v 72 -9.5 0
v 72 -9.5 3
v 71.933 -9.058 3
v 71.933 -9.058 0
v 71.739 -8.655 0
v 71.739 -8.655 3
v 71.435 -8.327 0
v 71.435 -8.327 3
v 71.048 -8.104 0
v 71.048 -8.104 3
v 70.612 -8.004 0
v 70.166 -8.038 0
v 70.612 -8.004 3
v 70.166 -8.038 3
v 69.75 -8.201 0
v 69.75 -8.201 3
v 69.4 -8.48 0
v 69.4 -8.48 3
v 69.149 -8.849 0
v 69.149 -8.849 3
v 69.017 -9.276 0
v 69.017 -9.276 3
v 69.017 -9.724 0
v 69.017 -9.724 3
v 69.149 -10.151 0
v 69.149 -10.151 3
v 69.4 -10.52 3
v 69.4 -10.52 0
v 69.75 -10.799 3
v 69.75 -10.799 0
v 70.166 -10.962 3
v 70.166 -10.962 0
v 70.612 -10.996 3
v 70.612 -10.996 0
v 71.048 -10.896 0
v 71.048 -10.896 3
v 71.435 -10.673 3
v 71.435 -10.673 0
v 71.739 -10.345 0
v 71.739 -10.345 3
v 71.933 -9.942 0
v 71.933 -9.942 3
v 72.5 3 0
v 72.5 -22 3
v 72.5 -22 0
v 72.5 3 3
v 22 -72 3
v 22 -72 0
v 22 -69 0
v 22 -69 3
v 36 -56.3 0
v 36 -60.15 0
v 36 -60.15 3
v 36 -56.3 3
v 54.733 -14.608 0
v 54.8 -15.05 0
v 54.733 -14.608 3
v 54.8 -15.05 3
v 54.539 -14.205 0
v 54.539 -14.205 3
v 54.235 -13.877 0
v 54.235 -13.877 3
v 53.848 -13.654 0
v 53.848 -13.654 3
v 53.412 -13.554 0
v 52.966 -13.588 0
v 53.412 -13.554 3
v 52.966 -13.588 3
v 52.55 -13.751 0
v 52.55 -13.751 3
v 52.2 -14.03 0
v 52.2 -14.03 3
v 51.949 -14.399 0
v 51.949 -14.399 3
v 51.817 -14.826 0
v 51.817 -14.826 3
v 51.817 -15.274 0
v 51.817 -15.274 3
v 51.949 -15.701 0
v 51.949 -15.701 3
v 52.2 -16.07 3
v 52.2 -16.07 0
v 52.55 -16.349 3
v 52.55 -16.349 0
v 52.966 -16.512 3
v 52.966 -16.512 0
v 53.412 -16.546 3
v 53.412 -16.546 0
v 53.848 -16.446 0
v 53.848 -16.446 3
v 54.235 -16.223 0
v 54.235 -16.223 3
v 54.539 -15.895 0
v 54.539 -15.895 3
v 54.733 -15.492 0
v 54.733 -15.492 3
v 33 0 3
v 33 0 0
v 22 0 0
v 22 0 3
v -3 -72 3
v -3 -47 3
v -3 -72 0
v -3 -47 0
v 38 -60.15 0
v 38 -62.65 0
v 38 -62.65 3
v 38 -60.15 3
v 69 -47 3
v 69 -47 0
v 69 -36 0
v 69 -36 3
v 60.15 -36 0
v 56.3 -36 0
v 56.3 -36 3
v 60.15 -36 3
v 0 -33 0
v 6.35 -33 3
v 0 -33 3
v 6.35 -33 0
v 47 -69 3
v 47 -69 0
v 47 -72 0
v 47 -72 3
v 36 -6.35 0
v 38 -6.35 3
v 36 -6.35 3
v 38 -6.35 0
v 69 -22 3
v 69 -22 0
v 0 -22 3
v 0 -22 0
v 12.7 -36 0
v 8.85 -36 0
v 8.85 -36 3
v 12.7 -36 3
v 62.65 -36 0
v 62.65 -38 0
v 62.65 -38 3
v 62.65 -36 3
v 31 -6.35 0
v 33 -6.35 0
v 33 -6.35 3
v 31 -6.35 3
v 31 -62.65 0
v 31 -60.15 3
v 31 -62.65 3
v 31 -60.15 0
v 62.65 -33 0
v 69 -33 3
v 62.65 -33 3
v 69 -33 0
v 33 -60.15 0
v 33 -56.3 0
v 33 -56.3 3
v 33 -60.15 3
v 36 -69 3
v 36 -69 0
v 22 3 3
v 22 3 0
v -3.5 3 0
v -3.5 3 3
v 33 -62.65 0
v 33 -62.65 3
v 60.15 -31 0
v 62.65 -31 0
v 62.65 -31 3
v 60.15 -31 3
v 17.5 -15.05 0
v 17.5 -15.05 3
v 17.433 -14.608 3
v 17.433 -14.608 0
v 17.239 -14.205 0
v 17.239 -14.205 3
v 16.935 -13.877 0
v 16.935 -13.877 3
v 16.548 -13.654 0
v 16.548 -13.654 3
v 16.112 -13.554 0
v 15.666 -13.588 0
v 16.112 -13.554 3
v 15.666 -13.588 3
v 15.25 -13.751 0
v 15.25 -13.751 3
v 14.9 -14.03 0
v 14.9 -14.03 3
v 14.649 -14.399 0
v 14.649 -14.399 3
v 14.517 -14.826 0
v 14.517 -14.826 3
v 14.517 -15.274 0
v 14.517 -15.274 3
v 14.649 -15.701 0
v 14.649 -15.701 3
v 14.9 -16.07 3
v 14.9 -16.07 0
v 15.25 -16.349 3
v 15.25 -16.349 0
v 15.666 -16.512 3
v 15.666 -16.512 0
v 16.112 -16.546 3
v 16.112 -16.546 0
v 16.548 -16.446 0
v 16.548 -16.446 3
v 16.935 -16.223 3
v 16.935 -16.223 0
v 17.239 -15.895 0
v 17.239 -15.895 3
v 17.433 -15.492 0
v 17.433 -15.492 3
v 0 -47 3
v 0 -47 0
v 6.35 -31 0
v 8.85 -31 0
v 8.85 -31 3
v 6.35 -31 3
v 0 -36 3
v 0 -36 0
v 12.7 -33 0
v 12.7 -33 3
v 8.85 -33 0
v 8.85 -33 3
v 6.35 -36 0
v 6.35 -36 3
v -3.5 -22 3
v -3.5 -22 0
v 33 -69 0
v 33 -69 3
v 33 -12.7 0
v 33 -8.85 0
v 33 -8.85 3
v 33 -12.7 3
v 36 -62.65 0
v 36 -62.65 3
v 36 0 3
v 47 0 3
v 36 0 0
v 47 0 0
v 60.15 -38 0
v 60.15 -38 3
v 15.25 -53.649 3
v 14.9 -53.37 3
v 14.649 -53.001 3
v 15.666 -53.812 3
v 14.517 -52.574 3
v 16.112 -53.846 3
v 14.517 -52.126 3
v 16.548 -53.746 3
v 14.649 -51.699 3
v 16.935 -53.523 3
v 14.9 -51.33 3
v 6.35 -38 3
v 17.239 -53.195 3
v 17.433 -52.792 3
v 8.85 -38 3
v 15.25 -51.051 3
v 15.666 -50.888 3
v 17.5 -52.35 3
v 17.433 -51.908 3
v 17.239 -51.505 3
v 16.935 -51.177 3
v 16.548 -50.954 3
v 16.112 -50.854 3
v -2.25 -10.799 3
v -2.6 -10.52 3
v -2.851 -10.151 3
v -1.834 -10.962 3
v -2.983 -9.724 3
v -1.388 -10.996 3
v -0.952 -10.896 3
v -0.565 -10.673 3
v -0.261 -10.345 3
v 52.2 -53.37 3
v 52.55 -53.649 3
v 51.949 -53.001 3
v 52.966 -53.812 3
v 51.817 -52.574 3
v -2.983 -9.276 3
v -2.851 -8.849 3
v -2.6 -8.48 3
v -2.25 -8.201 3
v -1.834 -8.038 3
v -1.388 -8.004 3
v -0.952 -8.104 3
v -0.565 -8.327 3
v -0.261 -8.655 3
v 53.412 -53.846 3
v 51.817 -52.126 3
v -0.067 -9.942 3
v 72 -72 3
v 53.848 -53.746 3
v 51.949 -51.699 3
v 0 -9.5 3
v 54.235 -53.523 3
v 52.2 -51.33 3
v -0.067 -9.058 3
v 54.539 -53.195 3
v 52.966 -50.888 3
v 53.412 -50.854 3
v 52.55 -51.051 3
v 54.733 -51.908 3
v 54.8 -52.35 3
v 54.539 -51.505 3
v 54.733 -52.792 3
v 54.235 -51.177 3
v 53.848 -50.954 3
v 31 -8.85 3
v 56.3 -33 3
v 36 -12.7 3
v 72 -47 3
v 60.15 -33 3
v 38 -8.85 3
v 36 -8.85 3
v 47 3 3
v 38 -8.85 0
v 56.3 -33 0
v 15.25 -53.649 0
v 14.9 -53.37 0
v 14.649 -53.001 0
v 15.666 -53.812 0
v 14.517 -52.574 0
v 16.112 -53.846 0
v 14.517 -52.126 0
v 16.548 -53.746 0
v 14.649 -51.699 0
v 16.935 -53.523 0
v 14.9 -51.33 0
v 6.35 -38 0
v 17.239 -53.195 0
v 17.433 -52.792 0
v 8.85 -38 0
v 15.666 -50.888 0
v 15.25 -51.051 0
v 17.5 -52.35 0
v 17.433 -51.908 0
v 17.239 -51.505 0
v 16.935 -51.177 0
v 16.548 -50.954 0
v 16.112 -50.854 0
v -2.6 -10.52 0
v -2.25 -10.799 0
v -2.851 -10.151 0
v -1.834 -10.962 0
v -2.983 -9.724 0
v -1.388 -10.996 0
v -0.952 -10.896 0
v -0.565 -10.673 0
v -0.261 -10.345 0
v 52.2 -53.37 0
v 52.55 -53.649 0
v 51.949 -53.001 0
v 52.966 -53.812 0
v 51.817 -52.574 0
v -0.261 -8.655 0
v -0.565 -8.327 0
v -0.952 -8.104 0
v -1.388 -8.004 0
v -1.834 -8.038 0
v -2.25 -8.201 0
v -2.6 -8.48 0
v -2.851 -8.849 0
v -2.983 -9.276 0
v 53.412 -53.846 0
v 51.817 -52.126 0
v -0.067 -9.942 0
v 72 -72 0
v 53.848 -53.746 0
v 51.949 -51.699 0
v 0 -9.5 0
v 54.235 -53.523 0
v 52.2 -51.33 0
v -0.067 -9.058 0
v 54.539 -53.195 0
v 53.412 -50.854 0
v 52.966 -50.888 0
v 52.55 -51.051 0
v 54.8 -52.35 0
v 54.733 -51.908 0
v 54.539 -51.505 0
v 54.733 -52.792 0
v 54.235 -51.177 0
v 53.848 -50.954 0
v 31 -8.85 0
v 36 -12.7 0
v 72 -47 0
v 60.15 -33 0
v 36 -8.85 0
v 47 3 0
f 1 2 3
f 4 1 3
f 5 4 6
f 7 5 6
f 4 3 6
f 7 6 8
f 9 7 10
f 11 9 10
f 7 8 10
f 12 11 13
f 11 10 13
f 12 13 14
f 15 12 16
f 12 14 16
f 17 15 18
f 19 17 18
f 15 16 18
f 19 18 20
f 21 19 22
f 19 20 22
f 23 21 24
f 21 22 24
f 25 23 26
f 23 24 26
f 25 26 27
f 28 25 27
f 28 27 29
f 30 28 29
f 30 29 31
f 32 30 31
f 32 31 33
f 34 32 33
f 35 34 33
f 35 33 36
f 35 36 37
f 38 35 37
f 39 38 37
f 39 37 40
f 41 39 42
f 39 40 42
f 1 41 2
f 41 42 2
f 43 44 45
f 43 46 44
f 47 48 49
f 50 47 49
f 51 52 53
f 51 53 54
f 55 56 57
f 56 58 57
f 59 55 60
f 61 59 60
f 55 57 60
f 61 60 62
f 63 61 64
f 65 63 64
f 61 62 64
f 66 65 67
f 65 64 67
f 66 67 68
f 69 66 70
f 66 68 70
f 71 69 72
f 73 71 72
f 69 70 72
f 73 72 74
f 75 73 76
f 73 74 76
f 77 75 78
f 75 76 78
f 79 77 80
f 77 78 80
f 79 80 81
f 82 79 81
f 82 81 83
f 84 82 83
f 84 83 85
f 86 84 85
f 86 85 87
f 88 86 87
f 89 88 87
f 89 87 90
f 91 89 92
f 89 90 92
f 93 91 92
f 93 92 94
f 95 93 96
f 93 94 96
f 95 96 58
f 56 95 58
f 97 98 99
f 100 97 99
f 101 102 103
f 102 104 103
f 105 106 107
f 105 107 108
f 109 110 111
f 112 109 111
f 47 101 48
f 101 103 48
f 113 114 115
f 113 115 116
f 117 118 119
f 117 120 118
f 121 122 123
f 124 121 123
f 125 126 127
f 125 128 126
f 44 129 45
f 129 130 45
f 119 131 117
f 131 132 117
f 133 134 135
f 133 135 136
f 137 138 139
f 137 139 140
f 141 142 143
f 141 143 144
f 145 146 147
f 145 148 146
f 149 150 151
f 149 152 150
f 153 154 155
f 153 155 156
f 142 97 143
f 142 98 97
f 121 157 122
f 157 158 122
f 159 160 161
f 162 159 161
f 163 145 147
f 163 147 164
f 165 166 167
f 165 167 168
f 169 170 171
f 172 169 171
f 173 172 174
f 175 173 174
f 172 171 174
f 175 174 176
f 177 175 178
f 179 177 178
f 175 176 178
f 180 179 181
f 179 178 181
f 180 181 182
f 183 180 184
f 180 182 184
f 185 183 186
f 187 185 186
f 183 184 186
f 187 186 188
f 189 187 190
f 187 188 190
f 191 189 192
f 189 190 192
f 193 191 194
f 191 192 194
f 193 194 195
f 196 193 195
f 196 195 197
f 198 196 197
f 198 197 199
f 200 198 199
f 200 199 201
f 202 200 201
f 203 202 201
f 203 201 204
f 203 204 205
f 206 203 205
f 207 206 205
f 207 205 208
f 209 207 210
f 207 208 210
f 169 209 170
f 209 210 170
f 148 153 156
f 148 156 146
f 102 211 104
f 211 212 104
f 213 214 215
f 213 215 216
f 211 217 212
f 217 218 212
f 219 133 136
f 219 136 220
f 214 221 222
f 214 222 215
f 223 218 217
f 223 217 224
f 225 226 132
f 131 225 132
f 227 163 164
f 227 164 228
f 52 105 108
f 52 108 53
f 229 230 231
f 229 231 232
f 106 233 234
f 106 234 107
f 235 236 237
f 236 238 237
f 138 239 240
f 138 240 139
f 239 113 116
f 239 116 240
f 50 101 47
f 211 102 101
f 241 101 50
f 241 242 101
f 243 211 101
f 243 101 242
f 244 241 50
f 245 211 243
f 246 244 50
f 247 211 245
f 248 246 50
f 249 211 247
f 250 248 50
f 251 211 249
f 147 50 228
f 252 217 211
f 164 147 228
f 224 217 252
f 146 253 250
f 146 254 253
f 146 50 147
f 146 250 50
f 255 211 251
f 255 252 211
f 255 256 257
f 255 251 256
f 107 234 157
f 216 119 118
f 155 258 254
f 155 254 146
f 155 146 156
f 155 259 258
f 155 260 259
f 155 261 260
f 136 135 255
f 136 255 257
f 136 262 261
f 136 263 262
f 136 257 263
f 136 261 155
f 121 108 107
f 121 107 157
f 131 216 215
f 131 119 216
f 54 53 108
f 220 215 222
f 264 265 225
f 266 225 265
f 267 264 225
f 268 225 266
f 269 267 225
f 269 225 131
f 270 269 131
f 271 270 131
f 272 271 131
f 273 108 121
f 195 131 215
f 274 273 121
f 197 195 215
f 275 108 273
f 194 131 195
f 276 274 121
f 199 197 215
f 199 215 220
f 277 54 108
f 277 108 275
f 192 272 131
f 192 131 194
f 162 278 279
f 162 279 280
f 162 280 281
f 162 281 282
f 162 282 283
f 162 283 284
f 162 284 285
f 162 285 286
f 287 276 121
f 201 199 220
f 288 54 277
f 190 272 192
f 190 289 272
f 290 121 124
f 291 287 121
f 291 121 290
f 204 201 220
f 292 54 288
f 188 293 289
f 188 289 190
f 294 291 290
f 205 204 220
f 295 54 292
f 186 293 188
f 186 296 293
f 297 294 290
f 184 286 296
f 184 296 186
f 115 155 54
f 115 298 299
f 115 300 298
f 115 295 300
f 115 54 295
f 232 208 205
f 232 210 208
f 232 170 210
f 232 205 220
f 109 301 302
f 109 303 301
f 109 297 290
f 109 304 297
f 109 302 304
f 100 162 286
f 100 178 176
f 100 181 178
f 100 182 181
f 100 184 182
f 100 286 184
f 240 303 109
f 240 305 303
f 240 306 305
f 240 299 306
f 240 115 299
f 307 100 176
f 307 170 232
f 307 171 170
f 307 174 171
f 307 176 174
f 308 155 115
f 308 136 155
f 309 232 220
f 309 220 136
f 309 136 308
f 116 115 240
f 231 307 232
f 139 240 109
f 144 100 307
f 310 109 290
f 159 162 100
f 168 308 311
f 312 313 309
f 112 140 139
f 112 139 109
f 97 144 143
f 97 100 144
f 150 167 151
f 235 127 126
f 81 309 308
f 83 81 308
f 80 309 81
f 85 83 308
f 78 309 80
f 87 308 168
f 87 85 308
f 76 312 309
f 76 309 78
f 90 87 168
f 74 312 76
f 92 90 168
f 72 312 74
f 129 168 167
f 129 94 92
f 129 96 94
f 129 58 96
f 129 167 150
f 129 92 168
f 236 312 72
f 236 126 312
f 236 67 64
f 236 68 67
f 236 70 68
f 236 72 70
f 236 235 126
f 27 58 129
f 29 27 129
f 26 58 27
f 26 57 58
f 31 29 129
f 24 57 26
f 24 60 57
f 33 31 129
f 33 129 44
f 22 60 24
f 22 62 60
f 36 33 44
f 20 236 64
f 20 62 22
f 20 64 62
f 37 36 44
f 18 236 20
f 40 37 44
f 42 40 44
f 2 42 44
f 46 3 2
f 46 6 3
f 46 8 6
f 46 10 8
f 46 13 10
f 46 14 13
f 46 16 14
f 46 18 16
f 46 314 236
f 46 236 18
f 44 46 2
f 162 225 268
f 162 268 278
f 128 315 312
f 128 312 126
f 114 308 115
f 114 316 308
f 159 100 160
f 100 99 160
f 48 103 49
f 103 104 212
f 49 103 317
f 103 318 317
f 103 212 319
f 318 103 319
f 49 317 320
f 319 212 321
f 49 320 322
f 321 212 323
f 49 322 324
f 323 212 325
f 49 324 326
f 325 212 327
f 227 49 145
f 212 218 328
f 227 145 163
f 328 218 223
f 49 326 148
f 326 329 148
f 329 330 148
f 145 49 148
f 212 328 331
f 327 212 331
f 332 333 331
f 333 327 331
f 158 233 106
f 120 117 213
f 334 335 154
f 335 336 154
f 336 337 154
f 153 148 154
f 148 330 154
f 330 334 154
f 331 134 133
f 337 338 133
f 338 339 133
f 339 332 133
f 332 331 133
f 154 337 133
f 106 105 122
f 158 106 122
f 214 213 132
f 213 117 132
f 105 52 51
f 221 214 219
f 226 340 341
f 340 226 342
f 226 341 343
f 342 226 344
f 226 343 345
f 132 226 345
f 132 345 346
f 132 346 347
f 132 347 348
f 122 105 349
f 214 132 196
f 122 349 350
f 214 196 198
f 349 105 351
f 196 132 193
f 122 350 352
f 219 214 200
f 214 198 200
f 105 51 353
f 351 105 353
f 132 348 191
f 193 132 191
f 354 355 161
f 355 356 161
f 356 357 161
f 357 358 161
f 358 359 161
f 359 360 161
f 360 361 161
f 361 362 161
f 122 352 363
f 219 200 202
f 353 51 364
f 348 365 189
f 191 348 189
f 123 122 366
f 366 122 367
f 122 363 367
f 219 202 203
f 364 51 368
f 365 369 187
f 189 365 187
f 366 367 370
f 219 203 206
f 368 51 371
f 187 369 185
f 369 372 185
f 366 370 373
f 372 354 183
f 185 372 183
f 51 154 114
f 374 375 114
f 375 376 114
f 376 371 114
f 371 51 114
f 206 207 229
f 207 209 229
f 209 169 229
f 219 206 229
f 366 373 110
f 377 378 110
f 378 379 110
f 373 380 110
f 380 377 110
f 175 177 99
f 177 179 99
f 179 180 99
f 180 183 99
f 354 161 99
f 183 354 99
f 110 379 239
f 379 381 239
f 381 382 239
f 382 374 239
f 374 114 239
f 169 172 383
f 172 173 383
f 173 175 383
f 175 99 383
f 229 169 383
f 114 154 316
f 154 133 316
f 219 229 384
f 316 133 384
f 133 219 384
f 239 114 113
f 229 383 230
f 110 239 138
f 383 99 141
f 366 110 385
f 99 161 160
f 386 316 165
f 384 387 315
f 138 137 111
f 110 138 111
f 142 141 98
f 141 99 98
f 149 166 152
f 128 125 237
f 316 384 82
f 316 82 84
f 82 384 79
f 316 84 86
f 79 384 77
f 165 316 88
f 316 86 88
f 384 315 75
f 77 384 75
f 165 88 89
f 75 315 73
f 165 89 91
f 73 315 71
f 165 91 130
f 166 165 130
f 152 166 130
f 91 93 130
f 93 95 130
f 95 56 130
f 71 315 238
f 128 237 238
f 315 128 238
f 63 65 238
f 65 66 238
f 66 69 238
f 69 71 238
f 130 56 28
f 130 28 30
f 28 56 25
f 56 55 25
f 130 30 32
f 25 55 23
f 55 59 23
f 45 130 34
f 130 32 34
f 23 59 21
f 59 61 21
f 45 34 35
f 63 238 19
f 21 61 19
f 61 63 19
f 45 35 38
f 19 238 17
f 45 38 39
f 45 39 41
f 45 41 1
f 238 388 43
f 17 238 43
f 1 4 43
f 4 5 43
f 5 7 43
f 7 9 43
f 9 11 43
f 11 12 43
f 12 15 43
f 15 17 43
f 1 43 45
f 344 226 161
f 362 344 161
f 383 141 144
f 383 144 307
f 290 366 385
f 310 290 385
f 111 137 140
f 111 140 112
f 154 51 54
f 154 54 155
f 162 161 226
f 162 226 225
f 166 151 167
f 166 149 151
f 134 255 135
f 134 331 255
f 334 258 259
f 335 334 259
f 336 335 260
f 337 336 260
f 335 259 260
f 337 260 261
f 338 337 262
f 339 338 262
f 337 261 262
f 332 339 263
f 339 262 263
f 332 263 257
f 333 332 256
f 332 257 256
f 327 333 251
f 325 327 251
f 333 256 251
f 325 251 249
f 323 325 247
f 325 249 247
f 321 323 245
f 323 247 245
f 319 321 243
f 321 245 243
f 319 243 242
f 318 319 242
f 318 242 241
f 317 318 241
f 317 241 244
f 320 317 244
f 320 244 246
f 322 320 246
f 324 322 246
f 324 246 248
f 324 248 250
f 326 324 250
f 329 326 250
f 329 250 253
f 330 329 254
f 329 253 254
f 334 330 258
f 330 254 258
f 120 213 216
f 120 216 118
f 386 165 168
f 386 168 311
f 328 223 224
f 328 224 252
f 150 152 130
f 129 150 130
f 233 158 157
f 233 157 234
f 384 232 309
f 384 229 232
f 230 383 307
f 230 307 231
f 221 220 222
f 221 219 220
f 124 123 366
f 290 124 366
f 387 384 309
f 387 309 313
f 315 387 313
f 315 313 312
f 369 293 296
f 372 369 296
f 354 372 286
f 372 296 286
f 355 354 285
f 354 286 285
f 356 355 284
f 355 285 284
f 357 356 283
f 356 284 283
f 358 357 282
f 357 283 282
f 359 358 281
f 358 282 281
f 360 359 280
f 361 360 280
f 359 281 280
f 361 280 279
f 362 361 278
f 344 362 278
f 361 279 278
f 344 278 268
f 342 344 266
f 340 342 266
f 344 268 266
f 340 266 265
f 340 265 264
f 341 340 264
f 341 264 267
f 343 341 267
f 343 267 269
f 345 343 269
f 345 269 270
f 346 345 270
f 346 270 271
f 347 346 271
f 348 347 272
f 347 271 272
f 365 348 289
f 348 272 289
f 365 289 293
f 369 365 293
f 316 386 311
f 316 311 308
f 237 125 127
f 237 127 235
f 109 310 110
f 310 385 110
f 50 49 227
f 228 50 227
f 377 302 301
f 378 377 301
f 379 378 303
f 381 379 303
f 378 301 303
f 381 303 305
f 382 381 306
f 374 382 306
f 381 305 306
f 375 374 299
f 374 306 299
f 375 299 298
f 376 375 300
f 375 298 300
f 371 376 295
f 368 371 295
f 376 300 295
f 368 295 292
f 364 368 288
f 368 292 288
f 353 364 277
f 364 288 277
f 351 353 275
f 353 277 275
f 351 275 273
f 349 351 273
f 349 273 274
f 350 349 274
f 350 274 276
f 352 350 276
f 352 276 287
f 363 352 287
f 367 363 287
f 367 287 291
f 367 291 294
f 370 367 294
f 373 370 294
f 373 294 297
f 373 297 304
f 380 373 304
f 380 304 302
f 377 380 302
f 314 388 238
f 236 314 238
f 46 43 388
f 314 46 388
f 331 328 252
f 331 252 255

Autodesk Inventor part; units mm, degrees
ref_plane "YZ Plane" through (0, 0, 0) normal (1, 0, 0) x (0, 1, 0)
ref_plane "XZ Plane" through (0, 0, 0) normal (0, 1, 0) x (-1, 0, 0)
ref_plane "XY Plane" through (0, 0, 0) normal (0, 0, 1) x (1, 0, 0)
sketch "Sketch1" plane through (0, 0, 0) normal (0, 0, 1) x (1, 0, 0)
  arc A0 (69, -46.7929) -> (69.7605, -47) centre (69, -48.2929) ccw projected
  line L0 (72, -47) -> (69.7605, -47) projected
  line L1 (72, -72) -> (72, -47) projected
  line L2 (47, -72) -> (72, -72) projected
  line L3 (47, -69) -> (47, -72) projected
  line L4 (22, -69) -> (33, -69) projected
  line L5 (22, -72) -> (22, -69) projected
  line L6 (-3, -72) -> (22, -72) projected
  line L7 (-3, -47) -> (-3, -72) projected
  line L8 (0, -47) -> (-3, -47) projected
  line L9 (0, -22) -> (0, -33) projected
  line L10 (-3, -22) -> (0, -22) projected
  line L11 (-3, 3) -> (-3, -8.5818) projected
  line L12 (22, 3) -> (-3, 3) projected
  line L13 (22, 0) -> (22, 3) projected
  line L14 (47, 0) -> (36, 0) projected
  line L15 (47, 3) -> (47, 0) projected
  line L16 (72, 3) -> (47, 3) projected
  line L17 (72, -22) -> (72, -9.5) projected
  line L18 (69, -22) -> (72, -22) projected
  line L19 (69, -46.7929) -> (69, -36) projected
  circle A1 centre (17, -3.5) radius 1.5 projected
  circle A2 centre (69, -16.7071) radius 1.5 projected
  circle A3 centre (20, -50.5) radius 1.5 projected
  line L20 (69.7605, -47) -> (69, -47)
  line L21 (69, -47) -> (69, -46.7929)
  line L22 (0, -36) -> (0, -47) projected
  line L23 (33, 0) -> (22, 0) projected
  line L24 (69, -33) -> (69, -22) projected
  line L25 (36, -69) -> (47, -69) projected
  line L26 (-3, -8.5818) -> (-3, -22) projected
  circle A4 centre (-1.5, -8.5818) radius 1.5 projected
  line L27 (72, -9.5) -> (72, 3) projected
  circle A5 centre (70.5, -9.5) radius 1.5 projected
  line L28 (36, -69) -> (36, -62.65) projected
  line L29 (36, -62.65) -> (38, -62.65) projected
  line L30 (38, -62.65) -> (38, -60.15) projected
  line L31 (38, -60.15) -> (36, -60.15) projected
  line L32 (36, -60.15) -> (36, -56.3) projected
  line L33 (36, -56.3) -> (33, -56.3) projected
  line L34 (33, -56.3) -> (33, -60.15) projected
  line L35 (33, -60.15) -> (31, -60.15) projected
  line L36 (31, -60.15) -> (31, -62.65) projected
  line L37 (31, -62.65) -> (33, -62.65) projected
  line L38 (33, -62.65) -> (33, -69) projected
  line L39 (0, -36) -> (6.35, -36) projected
  line L40 (6.35, -36) -> (6.35, -38) projected
  line L41 (6.35, -38) -> (8.85, -38) projected
  line L42 (8.85, -38) -> (8.85, -36) projected
  line L43 (8.85, -36) -> (12.7, -36) projected
  line L44 (12.7, -36) -> (12.7, -33) projected
  line L45 (12.7, -33) -> (8.85, -33) projected
  line L46 (8.85, -33) -> (8.85, -31) projected
  line L47 (8.85, -31) -> (6.35, -31) projected
  line L48 (6.35, -31) -> (6.35, -33) projected
  line L49 (6.35, -33) -> (0, -33) projected
  line L50 (33, 0) -> (33, -6.35) projected
  line L51 (33, -6.35) -> (31, -6.35) projected
  line L52 (31, -6.35) -> (31, -8.85) projected
  line L53 (31, -8.85) -> (33, -8.85) projected
  line L54 (33, -8.85) -> (33, -12.7) projected
  line L55 (33, -12.7) -> (36, -12.7) projected
  line L56 (36, -12.7) -> (36, -8.85) projected
  line L57 (36, -8.85) -> (38, -8.85) projected
  line L58 (38, -8.85) -> (38, -6.35) projected
  line L59 (38, -6.35) -> (36, -6.35) projected
  line L60 (36, -6.35) -> (36, 0) projected
  line L61 (69, -33) -> (62.65, -33) projected
  line L62 (62.65, -33) -> (62.65, -31) projected
  line L63 (62.65, -31) -> (60.15, -31) projected
  line L64 (60.15, -31) -> (60.15, -33) projected
  line L65 (60.15, -33) -> (56.3, -33) projected
  line L66 (56.3, -33) -> (56.3, -36) projected
  line L67 (56.3, -36) -> (60.15, -36) projected
  line L68 (60.15, -36) -> (60.15, -38) projected
  line L69 (60.15, -38) -> (62.65, -38) projected
  line L70 (62.65, -38) -> (62.65, -36) projected
  line L71 (62.65, -36) -> (69, -36) projected
  point P0 (0, 0)
extrude "Extrusion1" add sketch "Sketch1" along normal blind 3 contours L21 L20 A0 | A5 | A4 | A0 L0 L1 L2 L3 L25 L28 L29 L30 L31 L32 L33 L34 L35 L36 L37 L38 L4 L5 L6 L7 L8 L22 L39 L40 L41 L42 L43 L44 L45 L46 L47 L48 L49 L9 L10 L26 L11 L12 L13 L23 L50 L51 L52 L53 L54 L55 L56 L57 L58 L59 L60 L14 L15 L16 L27 L17 L18 L24 L61 L62 L63 L64 L65 L66 L67 L68 L69 L70 L71 L19 | A1 | A2 | A3
sketch "Sketch2" plane through (0, 0, 3) normal (0, 0, 1) x (1, 0, 0)
  circle A0 centre (16, -15.05) radius 1.5 projected
  circle A1 centre (53.3, -15.05) radius 1.5 projected
  circle A2 centre (16, -52.35) radius 1.5 projected
  circle A3 centre (53.3, -52.35) radius 1.5 projected
  point P0 (0, 0)
extrude "Extrusion2" cut sketch "Sketch2" against normal blind 3
sketch "Sketch3" plane through (0, 0, 3) normal (0, 0, 1) x (1, 0, 0)
  line L0 (22, 3) -> (-3, 3) projected
  circle A0 centre (16, -52.35) radius 1.5 projected
  circle A1 centre (16, -15.05) radius 1.5 projected
  circle A2 centre (53.3, -15.05) radius 1.5 projected
  circle A3 centre (53.3, -52.35) radius 1.5 projected
  line L1 (72, -47) -> (69, -47) projected
  line L2 (69, -47) -> (69, -36) projected
  line L3 (69, -22) -> (72, -22) projected
  line L4 (72, -22) -> (72, 3) projected
  line L5 (72, 3) -> (47, 3) projected
  line L6 (47, 3) -> (47, 0) projected
  line L7 (47, 0) -> (36, 0) projected
  line L8 (22, 0) -> (22, 3) projected
  line L9 (22, 3) -> (-3, 3) projected
  line L10 (-3, 3) -> (-3, -22) projected
  line L11 (-3, -22) -> (0, -22) projected
  line L12 (0, -22) -> (0, -33) projected
  line L13 (0, -47) -> (-3, -47) projected
  line L14 (-3, -47) -> (-3, -72) projected
  line L15 (-3, -72) -> (22, -72) projected
  line L16 (22, -72) -> (22, -69) projected
  line L17 (22, -69) -> (33, -69) projected
  line L18 (47, -69) -> (47, -72) projected
  line L19 (47, -72) -> (72, -72) projected
  line L20 (72, -72) -> (72, -47) projected
  line L21 (47, 0) -> (22, 0) projected
  line L22 (34.5, 0) -> (34.5, -12.7)
  line L23 (34.5, -6.35) -> (31, -6.35)
  line L24 (31, -6.35) -> (31, -8.85)
  line L25 (31, -8.85) -> (38, -8.85)
  line L26 (38, -8.85) -> (38, -6.35)
  line L27 (38, -6.35) -> (34.5, -6.35)
  line L28 (34.5, -12.7) -> (36, -12.7)
  line L29 (36, -12.7) -> (36, 0)
  line L30 (34.5, -12.7) -> (33, -12.7)
  line L31 (33, -12.7) -> (33, 0)
  line L32 (33, 0) -> (36, 0)
  line L33 (0, -22) -> (0, -47) projected
  line L34 (0, -34.5) -> (12.7, -34.5)
  line L35 (6.35, -34.5) -> (6.35, -31)
  line L36 (6.35, -31) -> (8.85, -31)
  line L37 (8.85, -31) -> (8.85, -38)
  line L38 (8.85, -38) -> (6.35, -38)
  line L39 (6.35, -38) -> (6.35, -34.5)
  line L40 (12.7, -34.5) -> (12.7, -36)
  line L41 (12.7, -36) -> (12.7, -33)
  line L42 (12.7, -33) -> (0, -33)
  line L43 (0, -36) -> (0, -33)
  line L44 (0, -36) -> (12.7, -36)
  line L45 (69, -34.5) -> (56.3, -34.5)
  line L46 (62.65, -34.5) -> (62.65, -31)
  line L47 (62.65, -31) -> (60.15, -31)
  line L48 (60.15, -31) -> (60.15, -38)
  line L49 (60.15, -38) -> (62.65, -38)
  line L50 (56.3, -34.5) -> (56.3, -36)
  line L51 (56.3, -36) -> (56.3, -33)
  line L52 (56.3, -33) -> (69, -33)
  line L53 (69, -36) -> (69, -33)
  line L54 (69, -36) -> (56.3, -36)
  line L55 (47, -69) -> (22, -69)
  line L56 (47, -69) -> (22, -69)
  line L57 (34.5, -69) -> (34.5, -56.3)
  line L58 (34.5, -62.65) -> (31, -62.65)
  line L59 (31, -62.65) -> (31, -60.15)
  line L60 (31, -60.15) -> (38, -60.15)
  line L61 (38, -60.15) -> (38, -62.65)
  line L62 (38, -62.65) -> (34.5, -62.65)
  line L63 (34.5, -56.3) -> (36, -56.3)
  line L64 (36, -56.3) -> (36, -69)
  line L65 (34.5, -56.3) -> (33, -56.3)
  line L66 (33, -56.3) -> (33, -69)
  line L67 (33, -69) -> (36, -69)
  line L68 (0, -33) -> (12.7, -33)
  line L69 (12.7, -33) -> (12.7, -36)
  line L70 (12.7, -36) -> (0, -36)
  line L71 (0, -36) -> (0, -33)
  line L72 (33, 0) -> (36, 0)
  line L73 (36, 0) -> (36, -12.7)
  line L74 (36, -12.7) -> (33, -12.7)
  line L75 (33, -12.7) -> (33, 0)
  line L76 (56.3, -33) -> (69, -33)
  line L77 (69, -33) -> (69, -36)
  line L78 (69, -36) -> (56.3, -36)
  line L79 (56.3, -36) -> (56.3, -33)
  line L80 (33, -56.3) -> (36, -56.3)
  line L81 (36, -56.3) -> (36, -69)
  line L82 (36, -69) -> (33, -69)
  line L83 (33, -69) -> (33, -56.3)
  line L84 (60.15, -38) -> (62.65, -38)
  line L85 (62.65, -38) -> (62.65, -31)
  line L86 (62.65, -31) -> (60.15, -31)
  line L87 (60.15, -31) -> (60.15, -38)
  line L88 (69, -33) -> (69, -22) projected
  line L89 (33, 0) -> (22, 0) projected
  line L90 (0, -36) -> (0, -47) projected
  line L91 (36, -69) -> (47, -69) projected
  line L92 (69, -36) -> (62.65, -36) projected
  line L93 (62.65, -36) -> (62.65, -38) projected
  line L94 (62.65, -38) -> (60.15, -38) projected
  line L95 (60.15, -38) -> (60.15, -36) projected
  line L96 (60.15, -36) -> (56.3, -36) projected
  line L97 (56.3, -36) -> (56.3, -33) projected
  line L98 (56.3, -33) -> (60.15, -33) projected
  line L99 (60.15, -33) -> (60.15, -31) projected
  line L100 (60.15, -31) -> (62.65, -31) projected
  line L101 (62.65, -31) -> (62.65, -33) projected
  line L102 (62.65, -33) -> (69, -33) projected
  line L103 (36, 0) -> (36, -6.35) projected
  line L104 (36, -6.35) -> (38, -6.35) projected
  line L105 (38, -6.35) -> (38, -8.85) projected
  line L106 (38, -8.85) -> (36, -8.85) projected
  line L107 (36, -8.85) -> (36, -12.7) projected
  line L108 (36, -12.7) -> (33, -12.7) projected
  line L109 (33, -12.7) -> (33, -8.85) projected
  line L110 (33, -8.85) -> (31, -8.85) projected
  line L111 (31, -8.85) -> (31, -6.35) projected
  line L112 (31, -6.35) -> (33, -6.35) projected
  line L113 (33, -6.35) -> (33, 0) projected
  line L114 (0, -33) -> (6.35, -33) projected
  line L115 (6.35, -33) -> (6.35, -31) projected
  line L116 (6.35, -31) -> (8.85, -31) projected
  line L117 (8.85, -31) -> (8.85, -33) projected
  line L118 (8.85, -33) -> (12.7, -33) projected
  line L119 (12.7, -33) -> (12.7, -36) projected
  line L120 (12.7, -36) -> (8.85, -36) projected
  line L121 (8.85, -36) -> (8.85, -38) projected
  line L122 (8.85, -38) -> (6.35, -38) projected
  line L123 (6.35, -38) -> (6.35, -36) projected
  line L124 (6.35, -36) -> (0, -36) projected
  line L125 (33, -69) -> (33, -62.65) projected
  line L126 (33, -62.65) -> (31, -62.65) projected
  line L127 (31, -62.65) -> (31, -60.15) projected
  line L128 (31, -60.15) -> (33, -60.15) projected
  line L129 (33, -60.15) -> (33, -56.3) projected
  line L130 (33, -56.3) -> (36, -56.3) projected
  line L131 (36, -56.3) -> (36, -60.15) projected
  line L132 (36, -60.15) -> (38, -60.15) projected
  line L133 (38, -60.15) -> (38, -62.65) projected
  line L134 (38, -62.65) -> (36, -62.65) projected
  line L135 (36, -62.65) -> (36, -69) projected
  point P0 (0, 0)
  dimension "d4" = 12.7
  dimension "d5" = 3.5
  dimension "d6" = 2.5
  dimension "d7" = 7
  dimension "d8" = 1.5
  dimension "d9" = 1.5
  dimension "d10" = 12.7
  dimension "d11" = 3.5
  dimension "d12" = 2.5
  dimension "d13" = 7
  dimension "d14" = 1.5
  dimension "d15" = 3
extrude "Extrusion3" cut sketch "Sketch3" against normal blind 25.4 contours L21 L22 L23 L31 | L21 L29 L27 L22 | L31 L25 L24 L23 | L23 L22 L25 L31 | L42 L35 L34 L33 | L27 L29 L25 L22 | L25 L22 L30 L31 | L34 L39 L44 L33 | L42 L37 L34 L35 | L35 L36 L37 L42 | L27 L26 L25 L29 | L25 L29 L28 L22 | L34 L37 L44 L39 | L42 L41 L34 L37 | L44 L37 L38 L39 | L34 L40 L44 L37 | L53 L45 L46 L52 | L52 L48 L47 L46 | L46 L45 L48 L52 | L53 L54 L85 L45 | L66 L58 L57 L55 | L85 L54 L48 L45 | L48 L45 L51 L52 | L57 L62 L64 L55 | L66 L60 L57 L58 | L58 L59 L60 L66 | L48 L54 L50 L45 | L85 L49 L48 L54 | L57 L60 L64 L62 | L66 L65 L57 L60 | L64 L60 L61 L62 | L57 L63 L64 L60
sketch "Sketch4" plane through (0, 0, 3) normal (0, 0, 1) x (1, 0, 0)
  line L0 (-3, -11) -> (-3, -8) projected
  line L1 (-3, 3) -> (-3, -22) projected
  line L2 (-3, -9.5) -> (-1.5, -9.5)
  line L3 (72, -22) -> (72, 3) projected
  line L4 (72, -9.5) -> (70.5, -9.5)
  circle A0 centre (70.5, -9.5) radius 1.5
  circle A1 centre (-1.5, -9.5) radius 1.5
  point P0 (0, 0)
  dimension "d18" = 1.5
  dimension "d19" = 1.5
extrude "Extrusion4" cut sketch "Sketch4" against normal blind 25.4
sketch "Sketch5" plane through (72, 3, 3) normal (1, 0, 0) x (0, 0, -1)
  line L0 (0, -12.5) -> (3, -12.5) projected
  line L1 (3, -12.5) -> (3, 0) projected
  line L2 (3, 0) -> (0, 0) projected
  line L3 (0, -12.5) -> (0, 0) projected
  line L4 (0, -25) -> (0, -12.5) projected
  line L5 (3, -25) -> (0, -25) projected
  line L6 (3, -25) -> (3, -12.5) projected
  point P0 (3, -3)
extrude "Extrusion5" add sketch "Sketch5" along normal blind 0.5
sketch "Sketch6" plane through (-3, 3, 0) normal (-1, 0, 0) x (0, 0, 1)
  line L0 (3, -12.5) -> (0, -12.5) projected
  line L1 (3, 0) -> (3, -12.5) projected
  line L2 (0, 0) -> (3, 0) projected
  line L3 (0, 0) -> (0, -12.5) projected
  line L4 (0, -12.5) -> (0, -25) projected
  line L5 (0, -25) -> (3, -25) projected
  line L6 (3, -12.5) -> (3, -25) projected
  line L7 (3, -12.5) -> (0, -12.5) projected
  line L8 (0, -12.5) -> (0, -25) projected
  line L9 (0, -25) -> (3, -25) projected
  line L10 (3, -12.5) -> (3, -25) projected
  line L11 (3, 0) -> (3, -12.5) projected
  line L12 (0, 0) -> (3, 0) projected
  line L13 (0, 0) -> (0, -12.5) projected
  point P0 (0, -3)
extrude "Extrusion6" add sketch "Sketch6" along normal blind 0.5
properties part number "pared ateral 2"
